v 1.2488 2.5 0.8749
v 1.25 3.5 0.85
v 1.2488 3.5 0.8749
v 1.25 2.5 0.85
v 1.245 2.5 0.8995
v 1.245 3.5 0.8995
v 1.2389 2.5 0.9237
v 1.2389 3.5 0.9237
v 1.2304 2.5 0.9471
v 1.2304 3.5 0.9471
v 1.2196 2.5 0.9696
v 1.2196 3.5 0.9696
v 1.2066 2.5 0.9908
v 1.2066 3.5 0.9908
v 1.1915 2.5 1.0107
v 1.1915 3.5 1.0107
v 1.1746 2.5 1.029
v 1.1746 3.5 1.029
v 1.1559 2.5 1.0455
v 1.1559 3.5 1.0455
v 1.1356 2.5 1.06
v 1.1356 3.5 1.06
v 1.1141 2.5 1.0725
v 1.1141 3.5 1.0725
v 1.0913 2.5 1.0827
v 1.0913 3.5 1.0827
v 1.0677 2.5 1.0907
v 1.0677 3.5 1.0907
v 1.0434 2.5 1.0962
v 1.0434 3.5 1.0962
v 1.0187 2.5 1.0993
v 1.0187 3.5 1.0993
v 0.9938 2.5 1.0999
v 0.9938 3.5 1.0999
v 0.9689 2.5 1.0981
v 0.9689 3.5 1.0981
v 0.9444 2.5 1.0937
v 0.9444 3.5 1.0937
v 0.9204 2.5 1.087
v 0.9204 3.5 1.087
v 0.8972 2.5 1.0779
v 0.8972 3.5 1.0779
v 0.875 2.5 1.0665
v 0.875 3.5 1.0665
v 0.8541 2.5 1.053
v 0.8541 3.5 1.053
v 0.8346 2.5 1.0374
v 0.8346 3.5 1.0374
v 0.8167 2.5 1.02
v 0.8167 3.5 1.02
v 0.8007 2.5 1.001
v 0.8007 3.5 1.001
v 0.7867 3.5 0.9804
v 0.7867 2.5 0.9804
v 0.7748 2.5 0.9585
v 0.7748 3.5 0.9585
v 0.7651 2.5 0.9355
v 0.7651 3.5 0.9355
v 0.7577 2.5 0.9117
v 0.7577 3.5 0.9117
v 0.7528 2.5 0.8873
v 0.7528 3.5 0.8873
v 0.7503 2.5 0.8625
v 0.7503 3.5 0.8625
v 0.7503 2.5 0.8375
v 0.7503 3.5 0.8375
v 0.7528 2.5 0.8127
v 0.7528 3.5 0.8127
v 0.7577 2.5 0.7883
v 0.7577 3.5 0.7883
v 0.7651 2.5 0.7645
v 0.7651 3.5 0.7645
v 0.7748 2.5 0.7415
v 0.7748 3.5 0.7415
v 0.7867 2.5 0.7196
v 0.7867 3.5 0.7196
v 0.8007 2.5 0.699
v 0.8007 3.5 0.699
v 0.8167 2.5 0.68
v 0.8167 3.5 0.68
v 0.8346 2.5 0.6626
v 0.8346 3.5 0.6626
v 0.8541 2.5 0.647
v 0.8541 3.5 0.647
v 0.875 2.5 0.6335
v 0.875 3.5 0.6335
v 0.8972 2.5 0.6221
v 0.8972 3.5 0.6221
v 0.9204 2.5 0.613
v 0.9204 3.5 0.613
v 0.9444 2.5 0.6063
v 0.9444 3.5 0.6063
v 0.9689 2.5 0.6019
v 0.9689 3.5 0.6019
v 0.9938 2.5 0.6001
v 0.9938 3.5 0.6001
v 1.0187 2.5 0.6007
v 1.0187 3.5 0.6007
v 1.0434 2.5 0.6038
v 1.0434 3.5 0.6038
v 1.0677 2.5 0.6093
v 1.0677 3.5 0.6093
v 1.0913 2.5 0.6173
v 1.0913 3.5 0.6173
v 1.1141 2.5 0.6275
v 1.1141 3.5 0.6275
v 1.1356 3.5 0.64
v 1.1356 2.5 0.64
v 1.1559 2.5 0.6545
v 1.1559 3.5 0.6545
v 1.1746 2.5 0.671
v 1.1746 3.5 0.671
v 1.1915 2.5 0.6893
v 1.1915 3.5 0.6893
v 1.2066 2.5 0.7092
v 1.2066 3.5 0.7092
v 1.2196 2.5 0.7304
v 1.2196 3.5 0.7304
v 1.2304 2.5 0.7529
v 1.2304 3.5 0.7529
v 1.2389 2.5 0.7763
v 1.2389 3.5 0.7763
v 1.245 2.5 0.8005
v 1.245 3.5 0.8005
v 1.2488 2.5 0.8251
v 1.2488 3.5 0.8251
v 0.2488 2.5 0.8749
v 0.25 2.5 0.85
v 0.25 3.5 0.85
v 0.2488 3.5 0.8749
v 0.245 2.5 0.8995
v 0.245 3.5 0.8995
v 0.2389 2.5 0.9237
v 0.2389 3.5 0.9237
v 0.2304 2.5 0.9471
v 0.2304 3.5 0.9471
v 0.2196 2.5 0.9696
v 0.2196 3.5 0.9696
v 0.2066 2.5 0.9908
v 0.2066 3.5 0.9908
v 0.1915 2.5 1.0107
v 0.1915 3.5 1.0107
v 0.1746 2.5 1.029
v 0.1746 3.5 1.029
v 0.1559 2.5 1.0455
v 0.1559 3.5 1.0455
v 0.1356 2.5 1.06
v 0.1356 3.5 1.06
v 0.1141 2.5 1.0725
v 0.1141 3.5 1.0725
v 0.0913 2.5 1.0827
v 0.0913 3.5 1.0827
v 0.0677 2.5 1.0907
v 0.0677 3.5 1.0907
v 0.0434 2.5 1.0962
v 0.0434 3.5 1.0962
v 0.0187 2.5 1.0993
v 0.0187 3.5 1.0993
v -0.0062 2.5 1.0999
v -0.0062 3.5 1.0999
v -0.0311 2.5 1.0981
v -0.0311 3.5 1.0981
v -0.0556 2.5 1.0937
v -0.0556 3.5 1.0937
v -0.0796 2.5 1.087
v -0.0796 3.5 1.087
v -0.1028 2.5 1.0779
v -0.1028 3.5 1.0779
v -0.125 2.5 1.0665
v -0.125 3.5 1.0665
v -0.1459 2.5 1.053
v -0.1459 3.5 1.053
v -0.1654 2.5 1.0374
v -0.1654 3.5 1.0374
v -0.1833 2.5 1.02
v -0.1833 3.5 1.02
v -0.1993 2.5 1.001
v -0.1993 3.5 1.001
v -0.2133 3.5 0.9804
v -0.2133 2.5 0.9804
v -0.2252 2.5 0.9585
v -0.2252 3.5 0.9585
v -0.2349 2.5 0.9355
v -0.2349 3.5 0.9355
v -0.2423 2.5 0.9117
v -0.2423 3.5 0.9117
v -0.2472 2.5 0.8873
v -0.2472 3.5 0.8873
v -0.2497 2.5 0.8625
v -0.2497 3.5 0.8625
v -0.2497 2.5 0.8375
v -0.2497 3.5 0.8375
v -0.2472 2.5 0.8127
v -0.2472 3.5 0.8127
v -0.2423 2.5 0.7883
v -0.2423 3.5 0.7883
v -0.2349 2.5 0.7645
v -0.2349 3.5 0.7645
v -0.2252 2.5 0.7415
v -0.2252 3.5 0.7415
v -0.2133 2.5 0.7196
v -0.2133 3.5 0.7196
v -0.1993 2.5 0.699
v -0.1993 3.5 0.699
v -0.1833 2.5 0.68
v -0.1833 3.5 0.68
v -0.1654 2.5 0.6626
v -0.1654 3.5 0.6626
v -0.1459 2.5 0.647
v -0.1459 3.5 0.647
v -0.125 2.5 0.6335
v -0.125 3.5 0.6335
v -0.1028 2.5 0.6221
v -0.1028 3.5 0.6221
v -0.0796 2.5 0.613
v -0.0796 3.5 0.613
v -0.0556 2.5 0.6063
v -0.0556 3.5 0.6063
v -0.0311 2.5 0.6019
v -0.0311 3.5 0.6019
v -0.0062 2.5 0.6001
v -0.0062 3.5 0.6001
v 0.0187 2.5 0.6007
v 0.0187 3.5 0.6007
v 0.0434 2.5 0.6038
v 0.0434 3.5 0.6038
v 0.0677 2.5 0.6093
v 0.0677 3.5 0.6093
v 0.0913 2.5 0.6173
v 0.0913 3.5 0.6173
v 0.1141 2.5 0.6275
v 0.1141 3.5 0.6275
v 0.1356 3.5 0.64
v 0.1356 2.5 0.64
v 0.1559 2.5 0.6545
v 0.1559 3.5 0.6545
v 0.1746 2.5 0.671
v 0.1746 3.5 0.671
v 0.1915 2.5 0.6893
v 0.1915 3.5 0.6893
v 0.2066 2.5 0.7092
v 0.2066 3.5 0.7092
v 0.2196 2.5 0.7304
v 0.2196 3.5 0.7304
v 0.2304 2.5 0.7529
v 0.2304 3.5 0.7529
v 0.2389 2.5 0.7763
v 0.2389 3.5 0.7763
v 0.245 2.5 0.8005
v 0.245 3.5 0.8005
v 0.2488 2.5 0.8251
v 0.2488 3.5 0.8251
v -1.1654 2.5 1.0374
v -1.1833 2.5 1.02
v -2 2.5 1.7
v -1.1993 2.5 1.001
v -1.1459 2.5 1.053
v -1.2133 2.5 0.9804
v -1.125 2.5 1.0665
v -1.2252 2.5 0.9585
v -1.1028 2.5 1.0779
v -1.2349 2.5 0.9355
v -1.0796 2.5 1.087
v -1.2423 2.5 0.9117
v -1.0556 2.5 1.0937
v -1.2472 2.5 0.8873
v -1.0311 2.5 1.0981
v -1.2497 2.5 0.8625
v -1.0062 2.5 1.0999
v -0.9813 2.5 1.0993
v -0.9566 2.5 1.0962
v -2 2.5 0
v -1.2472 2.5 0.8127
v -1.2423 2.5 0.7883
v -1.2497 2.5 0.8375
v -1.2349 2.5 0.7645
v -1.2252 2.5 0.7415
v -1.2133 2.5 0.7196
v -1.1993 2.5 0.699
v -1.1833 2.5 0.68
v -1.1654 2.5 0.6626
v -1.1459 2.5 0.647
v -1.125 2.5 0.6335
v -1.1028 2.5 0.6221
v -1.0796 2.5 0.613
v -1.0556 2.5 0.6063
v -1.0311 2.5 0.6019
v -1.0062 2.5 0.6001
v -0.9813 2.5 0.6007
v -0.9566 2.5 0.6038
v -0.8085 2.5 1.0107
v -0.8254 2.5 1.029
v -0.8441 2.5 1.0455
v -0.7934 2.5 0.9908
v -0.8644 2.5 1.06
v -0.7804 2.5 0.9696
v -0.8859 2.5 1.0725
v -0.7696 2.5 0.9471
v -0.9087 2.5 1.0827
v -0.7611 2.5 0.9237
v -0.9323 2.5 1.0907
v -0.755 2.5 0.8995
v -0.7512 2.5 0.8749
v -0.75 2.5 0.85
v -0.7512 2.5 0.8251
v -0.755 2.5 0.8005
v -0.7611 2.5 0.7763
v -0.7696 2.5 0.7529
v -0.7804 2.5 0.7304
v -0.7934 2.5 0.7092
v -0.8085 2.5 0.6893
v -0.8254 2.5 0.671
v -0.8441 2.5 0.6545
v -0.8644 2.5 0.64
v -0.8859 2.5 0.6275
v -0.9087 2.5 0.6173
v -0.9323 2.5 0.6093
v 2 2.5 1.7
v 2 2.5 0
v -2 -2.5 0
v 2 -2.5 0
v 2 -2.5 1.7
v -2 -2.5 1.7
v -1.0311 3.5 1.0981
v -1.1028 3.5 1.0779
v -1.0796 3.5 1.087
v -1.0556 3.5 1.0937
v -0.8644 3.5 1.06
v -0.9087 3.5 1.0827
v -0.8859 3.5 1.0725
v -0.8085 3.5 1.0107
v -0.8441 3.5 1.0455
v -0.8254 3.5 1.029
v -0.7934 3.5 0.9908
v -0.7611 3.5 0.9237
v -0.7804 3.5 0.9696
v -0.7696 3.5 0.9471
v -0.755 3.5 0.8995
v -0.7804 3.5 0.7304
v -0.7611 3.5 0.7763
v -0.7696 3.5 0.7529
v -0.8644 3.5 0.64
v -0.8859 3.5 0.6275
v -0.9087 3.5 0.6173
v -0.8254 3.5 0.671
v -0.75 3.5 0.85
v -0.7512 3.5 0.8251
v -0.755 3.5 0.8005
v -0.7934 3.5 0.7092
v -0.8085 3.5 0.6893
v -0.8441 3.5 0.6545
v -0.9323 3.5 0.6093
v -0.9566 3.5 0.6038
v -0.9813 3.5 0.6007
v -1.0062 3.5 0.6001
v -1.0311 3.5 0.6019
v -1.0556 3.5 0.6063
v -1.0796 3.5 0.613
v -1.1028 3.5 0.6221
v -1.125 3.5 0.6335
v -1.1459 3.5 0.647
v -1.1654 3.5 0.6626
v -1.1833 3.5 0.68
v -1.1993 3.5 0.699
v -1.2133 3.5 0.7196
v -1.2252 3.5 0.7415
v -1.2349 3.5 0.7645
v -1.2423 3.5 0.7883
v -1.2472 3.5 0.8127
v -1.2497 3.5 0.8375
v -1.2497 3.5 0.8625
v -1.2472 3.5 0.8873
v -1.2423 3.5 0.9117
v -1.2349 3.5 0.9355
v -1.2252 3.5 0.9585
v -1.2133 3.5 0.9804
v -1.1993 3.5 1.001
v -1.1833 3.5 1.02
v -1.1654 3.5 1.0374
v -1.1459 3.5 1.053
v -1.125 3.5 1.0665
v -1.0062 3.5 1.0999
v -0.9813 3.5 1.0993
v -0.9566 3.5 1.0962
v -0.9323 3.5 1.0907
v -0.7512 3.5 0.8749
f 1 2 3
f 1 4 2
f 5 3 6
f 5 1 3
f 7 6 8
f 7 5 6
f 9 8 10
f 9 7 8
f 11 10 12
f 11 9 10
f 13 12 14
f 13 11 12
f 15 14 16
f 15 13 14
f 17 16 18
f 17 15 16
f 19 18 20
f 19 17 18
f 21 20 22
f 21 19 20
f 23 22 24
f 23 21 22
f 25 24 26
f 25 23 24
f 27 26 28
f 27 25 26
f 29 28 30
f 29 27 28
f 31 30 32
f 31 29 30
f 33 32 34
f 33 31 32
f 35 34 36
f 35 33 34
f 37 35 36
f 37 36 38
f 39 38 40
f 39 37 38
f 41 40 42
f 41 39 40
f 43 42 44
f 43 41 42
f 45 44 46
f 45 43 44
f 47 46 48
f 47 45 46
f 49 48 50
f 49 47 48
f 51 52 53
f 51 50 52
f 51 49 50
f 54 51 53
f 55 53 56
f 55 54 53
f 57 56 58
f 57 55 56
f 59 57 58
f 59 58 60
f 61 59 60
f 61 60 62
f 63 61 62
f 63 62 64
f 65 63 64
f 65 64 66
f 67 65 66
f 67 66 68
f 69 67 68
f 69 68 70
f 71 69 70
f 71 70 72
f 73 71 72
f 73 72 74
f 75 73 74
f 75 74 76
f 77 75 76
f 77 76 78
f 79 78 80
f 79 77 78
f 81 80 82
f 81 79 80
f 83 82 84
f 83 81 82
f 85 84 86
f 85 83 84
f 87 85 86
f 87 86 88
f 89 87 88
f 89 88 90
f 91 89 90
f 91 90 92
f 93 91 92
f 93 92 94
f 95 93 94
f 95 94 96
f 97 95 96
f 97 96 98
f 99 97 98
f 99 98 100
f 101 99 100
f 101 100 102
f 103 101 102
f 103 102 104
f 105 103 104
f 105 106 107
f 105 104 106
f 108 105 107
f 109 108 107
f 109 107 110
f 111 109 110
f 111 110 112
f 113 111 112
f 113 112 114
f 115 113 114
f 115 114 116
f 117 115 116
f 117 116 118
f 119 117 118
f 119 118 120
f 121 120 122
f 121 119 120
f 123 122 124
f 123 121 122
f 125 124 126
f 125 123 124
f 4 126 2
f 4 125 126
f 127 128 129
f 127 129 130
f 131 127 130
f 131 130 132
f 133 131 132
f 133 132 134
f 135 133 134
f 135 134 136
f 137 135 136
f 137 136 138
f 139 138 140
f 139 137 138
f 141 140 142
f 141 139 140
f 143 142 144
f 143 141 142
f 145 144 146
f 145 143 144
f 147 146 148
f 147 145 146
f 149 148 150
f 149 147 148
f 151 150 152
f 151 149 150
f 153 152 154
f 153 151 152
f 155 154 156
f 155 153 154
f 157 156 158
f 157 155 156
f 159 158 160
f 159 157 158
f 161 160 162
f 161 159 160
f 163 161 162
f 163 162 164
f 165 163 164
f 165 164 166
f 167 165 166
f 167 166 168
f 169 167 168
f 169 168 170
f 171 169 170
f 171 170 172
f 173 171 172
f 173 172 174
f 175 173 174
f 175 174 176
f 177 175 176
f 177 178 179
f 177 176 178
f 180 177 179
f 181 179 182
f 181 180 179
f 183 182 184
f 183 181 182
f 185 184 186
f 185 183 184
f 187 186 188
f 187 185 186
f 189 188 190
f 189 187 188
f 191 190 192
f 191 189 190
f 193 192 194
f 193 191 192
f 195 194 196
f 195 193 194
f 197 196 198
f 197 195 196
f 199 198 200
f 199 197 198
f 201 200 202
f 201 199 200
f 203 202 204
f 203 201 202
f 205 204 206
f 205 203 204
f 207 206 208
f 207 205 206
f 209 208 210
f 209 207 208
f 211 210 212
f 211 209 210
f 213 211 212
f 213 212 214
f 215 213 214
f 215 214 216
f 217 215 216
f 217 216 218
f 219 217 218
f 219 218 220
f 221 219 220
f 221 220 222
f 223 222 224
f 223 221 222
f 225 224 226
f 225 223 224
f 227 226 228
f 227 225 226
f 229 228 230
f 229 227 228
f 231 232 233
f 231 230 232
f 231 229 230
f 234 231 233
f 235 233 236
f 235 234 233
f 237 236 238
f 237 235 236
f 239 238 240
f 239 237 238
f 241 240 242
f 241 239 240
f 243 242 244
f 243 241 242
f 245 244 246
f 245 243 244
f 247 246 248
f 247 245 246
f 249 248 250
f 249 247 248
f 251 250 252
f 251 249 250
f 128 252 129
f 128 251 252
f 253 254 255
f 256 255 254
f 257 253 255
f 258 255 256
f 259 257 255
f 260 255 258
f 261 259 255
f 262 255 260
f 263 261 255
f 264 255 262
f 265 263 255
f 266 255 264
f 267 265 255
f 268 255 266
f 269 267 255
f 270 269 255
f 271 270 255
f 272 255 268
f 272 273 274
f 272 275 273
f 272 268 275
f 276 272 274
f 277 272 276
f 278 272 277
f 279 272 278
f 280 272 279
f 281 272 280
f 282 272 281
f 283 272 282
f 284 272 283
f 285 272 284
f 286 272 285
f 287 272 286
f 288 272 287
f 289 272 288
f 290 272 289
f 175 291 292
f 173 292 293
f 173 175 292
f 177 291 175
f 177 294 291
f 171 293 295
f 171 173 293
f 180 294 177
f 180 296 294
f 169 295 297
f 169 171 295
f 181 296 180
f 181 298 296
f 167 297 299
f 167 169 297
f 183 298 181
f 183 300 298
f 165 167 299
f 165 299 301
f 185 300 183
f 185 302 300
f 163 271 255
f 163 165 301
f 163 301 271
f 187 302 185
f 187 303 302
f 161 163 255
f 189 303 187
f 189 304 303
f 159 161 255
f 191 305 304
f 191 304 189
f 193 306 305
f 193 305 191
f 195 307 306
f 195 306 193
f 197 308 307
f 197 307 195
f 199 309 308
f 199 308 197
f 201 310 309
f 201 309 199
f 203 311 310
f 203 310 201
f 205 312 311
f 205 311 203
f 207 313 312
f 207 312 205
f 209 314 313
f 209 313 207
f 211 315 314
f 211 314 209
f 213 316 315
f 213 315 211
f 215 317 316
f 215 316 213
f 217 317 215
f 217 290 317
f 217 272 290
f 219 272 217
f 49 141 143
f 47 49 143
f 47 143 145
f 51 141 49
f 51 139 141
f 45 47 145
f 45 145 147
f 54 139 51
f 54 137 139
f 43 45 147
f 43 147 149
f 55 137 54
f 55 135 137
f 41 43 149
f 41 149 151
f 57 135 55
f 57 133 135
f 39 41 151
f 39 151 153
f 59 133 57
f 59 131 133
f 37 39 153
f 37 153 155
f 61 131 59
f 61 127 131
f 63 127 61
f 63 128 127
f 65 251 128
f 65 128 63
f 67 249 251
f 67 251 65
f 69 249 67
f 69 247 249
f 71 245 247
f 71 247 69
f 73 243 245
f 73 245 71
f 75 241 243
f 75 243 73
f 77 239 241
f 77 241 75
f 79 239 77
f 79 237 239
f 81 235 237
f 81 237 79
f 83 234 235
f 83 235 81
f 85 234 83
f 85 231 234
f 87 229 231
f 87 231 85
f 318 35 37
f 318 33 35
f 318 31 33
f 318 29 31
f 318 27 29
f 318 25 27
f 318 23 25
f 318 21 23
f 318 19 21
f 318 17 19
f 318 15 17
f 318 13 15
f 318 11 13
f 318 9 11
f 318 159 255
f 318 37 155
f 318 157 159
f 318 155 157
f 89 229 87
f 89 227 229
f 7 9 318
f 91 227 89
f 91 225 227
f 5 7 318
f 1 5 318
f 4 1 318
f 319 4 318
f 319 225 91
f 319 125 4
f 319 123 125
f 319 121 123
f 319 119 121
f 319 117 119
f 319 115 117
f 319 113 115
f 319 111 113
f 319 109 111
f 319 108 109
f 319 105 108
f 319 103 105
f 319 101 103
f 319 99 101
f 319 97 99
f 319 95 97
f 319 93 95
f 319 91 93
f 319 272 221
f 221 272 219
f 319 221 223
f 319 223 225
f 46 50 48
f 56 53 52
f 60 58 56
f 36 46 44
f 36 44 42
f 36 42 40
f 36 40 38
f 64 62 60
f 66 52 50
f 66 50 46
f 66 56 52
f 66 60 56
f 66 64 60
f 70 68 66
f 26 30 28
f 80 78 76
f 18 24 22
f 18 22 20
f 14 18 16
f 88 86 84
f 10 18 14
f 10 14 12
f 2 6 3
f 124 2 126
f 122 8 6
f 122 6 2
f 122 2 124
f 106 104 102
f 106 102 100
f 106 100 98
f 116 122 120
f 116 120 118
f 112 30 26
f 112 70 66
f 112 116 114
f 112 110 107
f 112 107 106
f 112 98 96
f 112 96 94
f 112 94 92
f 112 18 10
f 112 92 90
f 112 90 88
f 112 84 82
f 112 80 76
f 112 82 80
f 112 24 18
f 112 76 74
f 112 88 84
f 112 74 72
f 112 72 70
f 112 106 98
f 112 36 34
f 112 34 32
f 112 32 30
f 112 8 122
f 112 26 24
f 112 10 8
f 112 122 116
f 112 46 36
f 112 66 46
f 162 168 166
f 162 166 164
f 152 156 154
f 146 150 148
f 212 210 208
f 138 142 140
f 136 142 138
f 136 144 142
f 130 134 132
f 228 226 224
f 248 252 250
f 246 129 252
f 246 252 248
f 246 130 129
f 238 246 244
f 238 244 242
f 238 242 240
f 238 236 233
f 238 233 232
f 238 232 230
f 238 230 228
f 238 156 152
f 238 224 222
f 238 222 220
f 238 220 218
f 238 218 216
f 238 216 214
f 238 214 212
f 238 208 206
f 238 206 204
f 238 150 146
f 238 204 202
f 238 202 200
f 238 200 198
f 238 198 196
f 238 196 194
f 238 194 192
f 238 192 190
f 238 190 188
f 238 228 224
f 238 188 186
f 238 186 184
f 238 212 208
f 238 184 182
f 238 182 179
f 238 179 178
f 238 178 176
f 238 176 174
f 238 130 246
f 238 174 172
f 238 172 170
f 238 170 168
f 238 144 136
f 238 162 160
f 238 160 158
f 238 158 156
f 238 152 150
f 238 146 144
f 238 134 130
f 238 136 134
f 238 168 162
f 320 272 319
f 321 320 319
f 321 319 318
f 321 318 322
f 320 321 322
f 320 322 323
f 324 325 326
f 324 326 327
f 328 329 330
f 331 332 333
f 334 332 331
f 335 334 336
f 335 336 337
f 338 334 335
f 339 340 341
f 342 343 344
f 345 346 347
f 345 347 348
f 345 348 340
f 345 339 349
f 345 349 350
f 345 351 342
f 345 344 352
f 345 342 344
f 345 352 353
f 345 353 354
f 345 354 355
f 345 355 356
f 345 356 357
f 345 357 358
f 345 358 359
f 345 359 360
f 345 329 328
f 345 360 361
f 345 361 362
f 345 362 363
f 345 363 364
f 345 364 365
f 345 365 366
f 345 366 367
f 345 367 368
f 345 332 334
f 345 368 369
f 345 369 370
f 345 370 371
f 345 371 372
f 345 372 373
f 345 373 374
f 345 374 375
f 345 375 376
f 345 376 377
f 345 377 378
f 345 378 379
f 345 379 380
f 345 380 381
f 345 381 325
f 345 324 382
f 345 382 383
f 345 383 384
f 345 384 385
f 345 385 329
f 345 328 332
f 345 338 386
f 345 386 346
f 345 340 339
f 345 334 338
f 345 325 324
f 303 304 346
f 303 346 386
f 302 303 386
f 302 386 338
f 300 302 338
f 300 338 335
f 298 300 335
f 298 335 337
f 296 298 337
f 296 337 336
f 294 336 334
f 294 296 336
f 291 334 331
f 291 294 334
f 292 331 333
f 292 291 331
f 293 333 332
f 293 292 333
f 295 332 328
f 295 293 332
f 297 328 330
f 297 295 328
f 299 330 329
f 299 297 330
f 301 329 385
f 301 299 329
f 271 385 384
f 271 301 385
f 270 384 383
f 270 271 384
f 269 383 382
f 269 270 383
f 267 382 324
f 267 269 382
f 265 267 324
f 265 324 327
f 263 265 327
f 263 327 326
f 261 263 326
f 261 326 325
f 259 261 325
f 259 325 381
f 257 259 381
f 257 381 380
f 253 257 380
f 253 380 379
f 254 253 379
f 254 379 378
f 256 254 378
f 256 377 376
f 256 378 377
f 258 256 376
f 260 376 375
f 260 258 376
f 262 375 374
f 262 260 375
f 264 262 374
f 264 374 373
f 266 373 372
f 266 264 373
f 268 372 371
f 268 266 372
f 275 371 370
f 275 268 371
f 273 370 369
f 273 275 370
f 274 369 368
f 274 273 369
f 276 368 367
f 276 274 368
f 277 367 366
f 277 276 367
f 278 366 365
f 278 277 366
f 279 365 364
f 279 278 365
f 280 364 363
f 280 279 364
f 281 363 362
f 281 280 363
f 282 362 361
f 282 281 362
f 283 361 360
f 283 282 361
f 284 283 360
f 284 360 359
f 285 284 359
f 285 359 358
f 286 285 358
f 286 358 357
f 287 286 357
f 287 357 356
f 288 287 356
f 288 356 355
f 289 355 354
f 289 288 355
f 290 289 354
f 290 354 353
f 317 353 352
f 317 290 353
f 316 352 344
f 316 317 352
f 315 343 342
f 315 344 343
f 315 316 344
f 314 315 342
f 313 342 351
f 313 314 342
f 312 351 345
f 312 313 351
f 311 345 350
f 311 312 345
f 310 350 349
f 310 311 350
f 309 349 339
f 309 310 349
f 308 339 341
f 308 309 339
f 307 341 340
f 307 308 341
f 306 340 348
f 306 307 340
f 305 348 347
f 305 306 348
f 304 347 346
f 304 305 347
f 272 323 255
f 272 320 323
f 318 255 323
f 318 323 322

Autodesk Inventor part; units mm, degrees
ref_plane "YZ Plane" through (0, 0, 0) normal (1, 0, 0) x (0, 1, 0)
ref_plane "XZ Plane" through (0, 0, 0) normal (0, 1, 0) x (-1, 0, 0)
ref_plane "XY Plane" through (0, 0, 0) normal (0, 0, 1) x (1, 0, 0)
sketch "Boceto1" plane through (0, 0, 0) normal (0, 0, 1) x (1, 0, 0)
  line L0 (-2, 2.5) -> (2, 2.5)
  line L1 (2, 2.5) -> (2, -2.5)
  line L2 (2, -2.5) -> (-2, -2.5)
  line L3 (-2, -2.5) -> (-2, 2.5)
  line L4 (0, -3.5) -> (0, 3.5) projected
  line L5 (-2.8, 0) -> (2.8, 0) projected
  point P0 (0, 0)
  dimension "d0" = 4
  dimension "d1" = 5
extrude "Extrusión1" add sketch "Boceto1" along normal blind 1.7
sketch "Boceto2" plane through (-2, 2.5, 0) normal (0, 1, 0) x (1, 0, 0)
  circle A0 centre (1, -0.85) radius 0.25
  circle A1 centre (2, -0.85) radius 0.25
  circle A2 centre (3, -0.85) radius 0.25
  line L0 (4, 0) -> (4, -1.7) projected
  line L1 (0, 0) -> (0, -1.7) projected
  line L2 (4, -1.7) -> (0, -1.7) projected
  point P0 (2, 0)
  dimension "d4" = 0.5
  dimension "d5" = 0.5
  dimension "d6" = 0.5
  dimension "d8" = 1
  dimension "d9" = 1
  dimension "d10" = 4
  dimension "d11" = 2
  dimension "d12" = 0.85
  dimension "d13" = 1.7
  dimension "d14" = 0.85
  dimension "d15" = 0.85
extrude "Extrusión2" add sketch "Boceto2" along normal blind 1
equation "\"d9\" = d8"
equation "\"d11\" = 0.5 * d10"
equation "\"d12\" = 0.5 * d13"
equation "\"d14\" = d12"
equation "\"d15\" = d12"
properties part number "Hall Sensor"
